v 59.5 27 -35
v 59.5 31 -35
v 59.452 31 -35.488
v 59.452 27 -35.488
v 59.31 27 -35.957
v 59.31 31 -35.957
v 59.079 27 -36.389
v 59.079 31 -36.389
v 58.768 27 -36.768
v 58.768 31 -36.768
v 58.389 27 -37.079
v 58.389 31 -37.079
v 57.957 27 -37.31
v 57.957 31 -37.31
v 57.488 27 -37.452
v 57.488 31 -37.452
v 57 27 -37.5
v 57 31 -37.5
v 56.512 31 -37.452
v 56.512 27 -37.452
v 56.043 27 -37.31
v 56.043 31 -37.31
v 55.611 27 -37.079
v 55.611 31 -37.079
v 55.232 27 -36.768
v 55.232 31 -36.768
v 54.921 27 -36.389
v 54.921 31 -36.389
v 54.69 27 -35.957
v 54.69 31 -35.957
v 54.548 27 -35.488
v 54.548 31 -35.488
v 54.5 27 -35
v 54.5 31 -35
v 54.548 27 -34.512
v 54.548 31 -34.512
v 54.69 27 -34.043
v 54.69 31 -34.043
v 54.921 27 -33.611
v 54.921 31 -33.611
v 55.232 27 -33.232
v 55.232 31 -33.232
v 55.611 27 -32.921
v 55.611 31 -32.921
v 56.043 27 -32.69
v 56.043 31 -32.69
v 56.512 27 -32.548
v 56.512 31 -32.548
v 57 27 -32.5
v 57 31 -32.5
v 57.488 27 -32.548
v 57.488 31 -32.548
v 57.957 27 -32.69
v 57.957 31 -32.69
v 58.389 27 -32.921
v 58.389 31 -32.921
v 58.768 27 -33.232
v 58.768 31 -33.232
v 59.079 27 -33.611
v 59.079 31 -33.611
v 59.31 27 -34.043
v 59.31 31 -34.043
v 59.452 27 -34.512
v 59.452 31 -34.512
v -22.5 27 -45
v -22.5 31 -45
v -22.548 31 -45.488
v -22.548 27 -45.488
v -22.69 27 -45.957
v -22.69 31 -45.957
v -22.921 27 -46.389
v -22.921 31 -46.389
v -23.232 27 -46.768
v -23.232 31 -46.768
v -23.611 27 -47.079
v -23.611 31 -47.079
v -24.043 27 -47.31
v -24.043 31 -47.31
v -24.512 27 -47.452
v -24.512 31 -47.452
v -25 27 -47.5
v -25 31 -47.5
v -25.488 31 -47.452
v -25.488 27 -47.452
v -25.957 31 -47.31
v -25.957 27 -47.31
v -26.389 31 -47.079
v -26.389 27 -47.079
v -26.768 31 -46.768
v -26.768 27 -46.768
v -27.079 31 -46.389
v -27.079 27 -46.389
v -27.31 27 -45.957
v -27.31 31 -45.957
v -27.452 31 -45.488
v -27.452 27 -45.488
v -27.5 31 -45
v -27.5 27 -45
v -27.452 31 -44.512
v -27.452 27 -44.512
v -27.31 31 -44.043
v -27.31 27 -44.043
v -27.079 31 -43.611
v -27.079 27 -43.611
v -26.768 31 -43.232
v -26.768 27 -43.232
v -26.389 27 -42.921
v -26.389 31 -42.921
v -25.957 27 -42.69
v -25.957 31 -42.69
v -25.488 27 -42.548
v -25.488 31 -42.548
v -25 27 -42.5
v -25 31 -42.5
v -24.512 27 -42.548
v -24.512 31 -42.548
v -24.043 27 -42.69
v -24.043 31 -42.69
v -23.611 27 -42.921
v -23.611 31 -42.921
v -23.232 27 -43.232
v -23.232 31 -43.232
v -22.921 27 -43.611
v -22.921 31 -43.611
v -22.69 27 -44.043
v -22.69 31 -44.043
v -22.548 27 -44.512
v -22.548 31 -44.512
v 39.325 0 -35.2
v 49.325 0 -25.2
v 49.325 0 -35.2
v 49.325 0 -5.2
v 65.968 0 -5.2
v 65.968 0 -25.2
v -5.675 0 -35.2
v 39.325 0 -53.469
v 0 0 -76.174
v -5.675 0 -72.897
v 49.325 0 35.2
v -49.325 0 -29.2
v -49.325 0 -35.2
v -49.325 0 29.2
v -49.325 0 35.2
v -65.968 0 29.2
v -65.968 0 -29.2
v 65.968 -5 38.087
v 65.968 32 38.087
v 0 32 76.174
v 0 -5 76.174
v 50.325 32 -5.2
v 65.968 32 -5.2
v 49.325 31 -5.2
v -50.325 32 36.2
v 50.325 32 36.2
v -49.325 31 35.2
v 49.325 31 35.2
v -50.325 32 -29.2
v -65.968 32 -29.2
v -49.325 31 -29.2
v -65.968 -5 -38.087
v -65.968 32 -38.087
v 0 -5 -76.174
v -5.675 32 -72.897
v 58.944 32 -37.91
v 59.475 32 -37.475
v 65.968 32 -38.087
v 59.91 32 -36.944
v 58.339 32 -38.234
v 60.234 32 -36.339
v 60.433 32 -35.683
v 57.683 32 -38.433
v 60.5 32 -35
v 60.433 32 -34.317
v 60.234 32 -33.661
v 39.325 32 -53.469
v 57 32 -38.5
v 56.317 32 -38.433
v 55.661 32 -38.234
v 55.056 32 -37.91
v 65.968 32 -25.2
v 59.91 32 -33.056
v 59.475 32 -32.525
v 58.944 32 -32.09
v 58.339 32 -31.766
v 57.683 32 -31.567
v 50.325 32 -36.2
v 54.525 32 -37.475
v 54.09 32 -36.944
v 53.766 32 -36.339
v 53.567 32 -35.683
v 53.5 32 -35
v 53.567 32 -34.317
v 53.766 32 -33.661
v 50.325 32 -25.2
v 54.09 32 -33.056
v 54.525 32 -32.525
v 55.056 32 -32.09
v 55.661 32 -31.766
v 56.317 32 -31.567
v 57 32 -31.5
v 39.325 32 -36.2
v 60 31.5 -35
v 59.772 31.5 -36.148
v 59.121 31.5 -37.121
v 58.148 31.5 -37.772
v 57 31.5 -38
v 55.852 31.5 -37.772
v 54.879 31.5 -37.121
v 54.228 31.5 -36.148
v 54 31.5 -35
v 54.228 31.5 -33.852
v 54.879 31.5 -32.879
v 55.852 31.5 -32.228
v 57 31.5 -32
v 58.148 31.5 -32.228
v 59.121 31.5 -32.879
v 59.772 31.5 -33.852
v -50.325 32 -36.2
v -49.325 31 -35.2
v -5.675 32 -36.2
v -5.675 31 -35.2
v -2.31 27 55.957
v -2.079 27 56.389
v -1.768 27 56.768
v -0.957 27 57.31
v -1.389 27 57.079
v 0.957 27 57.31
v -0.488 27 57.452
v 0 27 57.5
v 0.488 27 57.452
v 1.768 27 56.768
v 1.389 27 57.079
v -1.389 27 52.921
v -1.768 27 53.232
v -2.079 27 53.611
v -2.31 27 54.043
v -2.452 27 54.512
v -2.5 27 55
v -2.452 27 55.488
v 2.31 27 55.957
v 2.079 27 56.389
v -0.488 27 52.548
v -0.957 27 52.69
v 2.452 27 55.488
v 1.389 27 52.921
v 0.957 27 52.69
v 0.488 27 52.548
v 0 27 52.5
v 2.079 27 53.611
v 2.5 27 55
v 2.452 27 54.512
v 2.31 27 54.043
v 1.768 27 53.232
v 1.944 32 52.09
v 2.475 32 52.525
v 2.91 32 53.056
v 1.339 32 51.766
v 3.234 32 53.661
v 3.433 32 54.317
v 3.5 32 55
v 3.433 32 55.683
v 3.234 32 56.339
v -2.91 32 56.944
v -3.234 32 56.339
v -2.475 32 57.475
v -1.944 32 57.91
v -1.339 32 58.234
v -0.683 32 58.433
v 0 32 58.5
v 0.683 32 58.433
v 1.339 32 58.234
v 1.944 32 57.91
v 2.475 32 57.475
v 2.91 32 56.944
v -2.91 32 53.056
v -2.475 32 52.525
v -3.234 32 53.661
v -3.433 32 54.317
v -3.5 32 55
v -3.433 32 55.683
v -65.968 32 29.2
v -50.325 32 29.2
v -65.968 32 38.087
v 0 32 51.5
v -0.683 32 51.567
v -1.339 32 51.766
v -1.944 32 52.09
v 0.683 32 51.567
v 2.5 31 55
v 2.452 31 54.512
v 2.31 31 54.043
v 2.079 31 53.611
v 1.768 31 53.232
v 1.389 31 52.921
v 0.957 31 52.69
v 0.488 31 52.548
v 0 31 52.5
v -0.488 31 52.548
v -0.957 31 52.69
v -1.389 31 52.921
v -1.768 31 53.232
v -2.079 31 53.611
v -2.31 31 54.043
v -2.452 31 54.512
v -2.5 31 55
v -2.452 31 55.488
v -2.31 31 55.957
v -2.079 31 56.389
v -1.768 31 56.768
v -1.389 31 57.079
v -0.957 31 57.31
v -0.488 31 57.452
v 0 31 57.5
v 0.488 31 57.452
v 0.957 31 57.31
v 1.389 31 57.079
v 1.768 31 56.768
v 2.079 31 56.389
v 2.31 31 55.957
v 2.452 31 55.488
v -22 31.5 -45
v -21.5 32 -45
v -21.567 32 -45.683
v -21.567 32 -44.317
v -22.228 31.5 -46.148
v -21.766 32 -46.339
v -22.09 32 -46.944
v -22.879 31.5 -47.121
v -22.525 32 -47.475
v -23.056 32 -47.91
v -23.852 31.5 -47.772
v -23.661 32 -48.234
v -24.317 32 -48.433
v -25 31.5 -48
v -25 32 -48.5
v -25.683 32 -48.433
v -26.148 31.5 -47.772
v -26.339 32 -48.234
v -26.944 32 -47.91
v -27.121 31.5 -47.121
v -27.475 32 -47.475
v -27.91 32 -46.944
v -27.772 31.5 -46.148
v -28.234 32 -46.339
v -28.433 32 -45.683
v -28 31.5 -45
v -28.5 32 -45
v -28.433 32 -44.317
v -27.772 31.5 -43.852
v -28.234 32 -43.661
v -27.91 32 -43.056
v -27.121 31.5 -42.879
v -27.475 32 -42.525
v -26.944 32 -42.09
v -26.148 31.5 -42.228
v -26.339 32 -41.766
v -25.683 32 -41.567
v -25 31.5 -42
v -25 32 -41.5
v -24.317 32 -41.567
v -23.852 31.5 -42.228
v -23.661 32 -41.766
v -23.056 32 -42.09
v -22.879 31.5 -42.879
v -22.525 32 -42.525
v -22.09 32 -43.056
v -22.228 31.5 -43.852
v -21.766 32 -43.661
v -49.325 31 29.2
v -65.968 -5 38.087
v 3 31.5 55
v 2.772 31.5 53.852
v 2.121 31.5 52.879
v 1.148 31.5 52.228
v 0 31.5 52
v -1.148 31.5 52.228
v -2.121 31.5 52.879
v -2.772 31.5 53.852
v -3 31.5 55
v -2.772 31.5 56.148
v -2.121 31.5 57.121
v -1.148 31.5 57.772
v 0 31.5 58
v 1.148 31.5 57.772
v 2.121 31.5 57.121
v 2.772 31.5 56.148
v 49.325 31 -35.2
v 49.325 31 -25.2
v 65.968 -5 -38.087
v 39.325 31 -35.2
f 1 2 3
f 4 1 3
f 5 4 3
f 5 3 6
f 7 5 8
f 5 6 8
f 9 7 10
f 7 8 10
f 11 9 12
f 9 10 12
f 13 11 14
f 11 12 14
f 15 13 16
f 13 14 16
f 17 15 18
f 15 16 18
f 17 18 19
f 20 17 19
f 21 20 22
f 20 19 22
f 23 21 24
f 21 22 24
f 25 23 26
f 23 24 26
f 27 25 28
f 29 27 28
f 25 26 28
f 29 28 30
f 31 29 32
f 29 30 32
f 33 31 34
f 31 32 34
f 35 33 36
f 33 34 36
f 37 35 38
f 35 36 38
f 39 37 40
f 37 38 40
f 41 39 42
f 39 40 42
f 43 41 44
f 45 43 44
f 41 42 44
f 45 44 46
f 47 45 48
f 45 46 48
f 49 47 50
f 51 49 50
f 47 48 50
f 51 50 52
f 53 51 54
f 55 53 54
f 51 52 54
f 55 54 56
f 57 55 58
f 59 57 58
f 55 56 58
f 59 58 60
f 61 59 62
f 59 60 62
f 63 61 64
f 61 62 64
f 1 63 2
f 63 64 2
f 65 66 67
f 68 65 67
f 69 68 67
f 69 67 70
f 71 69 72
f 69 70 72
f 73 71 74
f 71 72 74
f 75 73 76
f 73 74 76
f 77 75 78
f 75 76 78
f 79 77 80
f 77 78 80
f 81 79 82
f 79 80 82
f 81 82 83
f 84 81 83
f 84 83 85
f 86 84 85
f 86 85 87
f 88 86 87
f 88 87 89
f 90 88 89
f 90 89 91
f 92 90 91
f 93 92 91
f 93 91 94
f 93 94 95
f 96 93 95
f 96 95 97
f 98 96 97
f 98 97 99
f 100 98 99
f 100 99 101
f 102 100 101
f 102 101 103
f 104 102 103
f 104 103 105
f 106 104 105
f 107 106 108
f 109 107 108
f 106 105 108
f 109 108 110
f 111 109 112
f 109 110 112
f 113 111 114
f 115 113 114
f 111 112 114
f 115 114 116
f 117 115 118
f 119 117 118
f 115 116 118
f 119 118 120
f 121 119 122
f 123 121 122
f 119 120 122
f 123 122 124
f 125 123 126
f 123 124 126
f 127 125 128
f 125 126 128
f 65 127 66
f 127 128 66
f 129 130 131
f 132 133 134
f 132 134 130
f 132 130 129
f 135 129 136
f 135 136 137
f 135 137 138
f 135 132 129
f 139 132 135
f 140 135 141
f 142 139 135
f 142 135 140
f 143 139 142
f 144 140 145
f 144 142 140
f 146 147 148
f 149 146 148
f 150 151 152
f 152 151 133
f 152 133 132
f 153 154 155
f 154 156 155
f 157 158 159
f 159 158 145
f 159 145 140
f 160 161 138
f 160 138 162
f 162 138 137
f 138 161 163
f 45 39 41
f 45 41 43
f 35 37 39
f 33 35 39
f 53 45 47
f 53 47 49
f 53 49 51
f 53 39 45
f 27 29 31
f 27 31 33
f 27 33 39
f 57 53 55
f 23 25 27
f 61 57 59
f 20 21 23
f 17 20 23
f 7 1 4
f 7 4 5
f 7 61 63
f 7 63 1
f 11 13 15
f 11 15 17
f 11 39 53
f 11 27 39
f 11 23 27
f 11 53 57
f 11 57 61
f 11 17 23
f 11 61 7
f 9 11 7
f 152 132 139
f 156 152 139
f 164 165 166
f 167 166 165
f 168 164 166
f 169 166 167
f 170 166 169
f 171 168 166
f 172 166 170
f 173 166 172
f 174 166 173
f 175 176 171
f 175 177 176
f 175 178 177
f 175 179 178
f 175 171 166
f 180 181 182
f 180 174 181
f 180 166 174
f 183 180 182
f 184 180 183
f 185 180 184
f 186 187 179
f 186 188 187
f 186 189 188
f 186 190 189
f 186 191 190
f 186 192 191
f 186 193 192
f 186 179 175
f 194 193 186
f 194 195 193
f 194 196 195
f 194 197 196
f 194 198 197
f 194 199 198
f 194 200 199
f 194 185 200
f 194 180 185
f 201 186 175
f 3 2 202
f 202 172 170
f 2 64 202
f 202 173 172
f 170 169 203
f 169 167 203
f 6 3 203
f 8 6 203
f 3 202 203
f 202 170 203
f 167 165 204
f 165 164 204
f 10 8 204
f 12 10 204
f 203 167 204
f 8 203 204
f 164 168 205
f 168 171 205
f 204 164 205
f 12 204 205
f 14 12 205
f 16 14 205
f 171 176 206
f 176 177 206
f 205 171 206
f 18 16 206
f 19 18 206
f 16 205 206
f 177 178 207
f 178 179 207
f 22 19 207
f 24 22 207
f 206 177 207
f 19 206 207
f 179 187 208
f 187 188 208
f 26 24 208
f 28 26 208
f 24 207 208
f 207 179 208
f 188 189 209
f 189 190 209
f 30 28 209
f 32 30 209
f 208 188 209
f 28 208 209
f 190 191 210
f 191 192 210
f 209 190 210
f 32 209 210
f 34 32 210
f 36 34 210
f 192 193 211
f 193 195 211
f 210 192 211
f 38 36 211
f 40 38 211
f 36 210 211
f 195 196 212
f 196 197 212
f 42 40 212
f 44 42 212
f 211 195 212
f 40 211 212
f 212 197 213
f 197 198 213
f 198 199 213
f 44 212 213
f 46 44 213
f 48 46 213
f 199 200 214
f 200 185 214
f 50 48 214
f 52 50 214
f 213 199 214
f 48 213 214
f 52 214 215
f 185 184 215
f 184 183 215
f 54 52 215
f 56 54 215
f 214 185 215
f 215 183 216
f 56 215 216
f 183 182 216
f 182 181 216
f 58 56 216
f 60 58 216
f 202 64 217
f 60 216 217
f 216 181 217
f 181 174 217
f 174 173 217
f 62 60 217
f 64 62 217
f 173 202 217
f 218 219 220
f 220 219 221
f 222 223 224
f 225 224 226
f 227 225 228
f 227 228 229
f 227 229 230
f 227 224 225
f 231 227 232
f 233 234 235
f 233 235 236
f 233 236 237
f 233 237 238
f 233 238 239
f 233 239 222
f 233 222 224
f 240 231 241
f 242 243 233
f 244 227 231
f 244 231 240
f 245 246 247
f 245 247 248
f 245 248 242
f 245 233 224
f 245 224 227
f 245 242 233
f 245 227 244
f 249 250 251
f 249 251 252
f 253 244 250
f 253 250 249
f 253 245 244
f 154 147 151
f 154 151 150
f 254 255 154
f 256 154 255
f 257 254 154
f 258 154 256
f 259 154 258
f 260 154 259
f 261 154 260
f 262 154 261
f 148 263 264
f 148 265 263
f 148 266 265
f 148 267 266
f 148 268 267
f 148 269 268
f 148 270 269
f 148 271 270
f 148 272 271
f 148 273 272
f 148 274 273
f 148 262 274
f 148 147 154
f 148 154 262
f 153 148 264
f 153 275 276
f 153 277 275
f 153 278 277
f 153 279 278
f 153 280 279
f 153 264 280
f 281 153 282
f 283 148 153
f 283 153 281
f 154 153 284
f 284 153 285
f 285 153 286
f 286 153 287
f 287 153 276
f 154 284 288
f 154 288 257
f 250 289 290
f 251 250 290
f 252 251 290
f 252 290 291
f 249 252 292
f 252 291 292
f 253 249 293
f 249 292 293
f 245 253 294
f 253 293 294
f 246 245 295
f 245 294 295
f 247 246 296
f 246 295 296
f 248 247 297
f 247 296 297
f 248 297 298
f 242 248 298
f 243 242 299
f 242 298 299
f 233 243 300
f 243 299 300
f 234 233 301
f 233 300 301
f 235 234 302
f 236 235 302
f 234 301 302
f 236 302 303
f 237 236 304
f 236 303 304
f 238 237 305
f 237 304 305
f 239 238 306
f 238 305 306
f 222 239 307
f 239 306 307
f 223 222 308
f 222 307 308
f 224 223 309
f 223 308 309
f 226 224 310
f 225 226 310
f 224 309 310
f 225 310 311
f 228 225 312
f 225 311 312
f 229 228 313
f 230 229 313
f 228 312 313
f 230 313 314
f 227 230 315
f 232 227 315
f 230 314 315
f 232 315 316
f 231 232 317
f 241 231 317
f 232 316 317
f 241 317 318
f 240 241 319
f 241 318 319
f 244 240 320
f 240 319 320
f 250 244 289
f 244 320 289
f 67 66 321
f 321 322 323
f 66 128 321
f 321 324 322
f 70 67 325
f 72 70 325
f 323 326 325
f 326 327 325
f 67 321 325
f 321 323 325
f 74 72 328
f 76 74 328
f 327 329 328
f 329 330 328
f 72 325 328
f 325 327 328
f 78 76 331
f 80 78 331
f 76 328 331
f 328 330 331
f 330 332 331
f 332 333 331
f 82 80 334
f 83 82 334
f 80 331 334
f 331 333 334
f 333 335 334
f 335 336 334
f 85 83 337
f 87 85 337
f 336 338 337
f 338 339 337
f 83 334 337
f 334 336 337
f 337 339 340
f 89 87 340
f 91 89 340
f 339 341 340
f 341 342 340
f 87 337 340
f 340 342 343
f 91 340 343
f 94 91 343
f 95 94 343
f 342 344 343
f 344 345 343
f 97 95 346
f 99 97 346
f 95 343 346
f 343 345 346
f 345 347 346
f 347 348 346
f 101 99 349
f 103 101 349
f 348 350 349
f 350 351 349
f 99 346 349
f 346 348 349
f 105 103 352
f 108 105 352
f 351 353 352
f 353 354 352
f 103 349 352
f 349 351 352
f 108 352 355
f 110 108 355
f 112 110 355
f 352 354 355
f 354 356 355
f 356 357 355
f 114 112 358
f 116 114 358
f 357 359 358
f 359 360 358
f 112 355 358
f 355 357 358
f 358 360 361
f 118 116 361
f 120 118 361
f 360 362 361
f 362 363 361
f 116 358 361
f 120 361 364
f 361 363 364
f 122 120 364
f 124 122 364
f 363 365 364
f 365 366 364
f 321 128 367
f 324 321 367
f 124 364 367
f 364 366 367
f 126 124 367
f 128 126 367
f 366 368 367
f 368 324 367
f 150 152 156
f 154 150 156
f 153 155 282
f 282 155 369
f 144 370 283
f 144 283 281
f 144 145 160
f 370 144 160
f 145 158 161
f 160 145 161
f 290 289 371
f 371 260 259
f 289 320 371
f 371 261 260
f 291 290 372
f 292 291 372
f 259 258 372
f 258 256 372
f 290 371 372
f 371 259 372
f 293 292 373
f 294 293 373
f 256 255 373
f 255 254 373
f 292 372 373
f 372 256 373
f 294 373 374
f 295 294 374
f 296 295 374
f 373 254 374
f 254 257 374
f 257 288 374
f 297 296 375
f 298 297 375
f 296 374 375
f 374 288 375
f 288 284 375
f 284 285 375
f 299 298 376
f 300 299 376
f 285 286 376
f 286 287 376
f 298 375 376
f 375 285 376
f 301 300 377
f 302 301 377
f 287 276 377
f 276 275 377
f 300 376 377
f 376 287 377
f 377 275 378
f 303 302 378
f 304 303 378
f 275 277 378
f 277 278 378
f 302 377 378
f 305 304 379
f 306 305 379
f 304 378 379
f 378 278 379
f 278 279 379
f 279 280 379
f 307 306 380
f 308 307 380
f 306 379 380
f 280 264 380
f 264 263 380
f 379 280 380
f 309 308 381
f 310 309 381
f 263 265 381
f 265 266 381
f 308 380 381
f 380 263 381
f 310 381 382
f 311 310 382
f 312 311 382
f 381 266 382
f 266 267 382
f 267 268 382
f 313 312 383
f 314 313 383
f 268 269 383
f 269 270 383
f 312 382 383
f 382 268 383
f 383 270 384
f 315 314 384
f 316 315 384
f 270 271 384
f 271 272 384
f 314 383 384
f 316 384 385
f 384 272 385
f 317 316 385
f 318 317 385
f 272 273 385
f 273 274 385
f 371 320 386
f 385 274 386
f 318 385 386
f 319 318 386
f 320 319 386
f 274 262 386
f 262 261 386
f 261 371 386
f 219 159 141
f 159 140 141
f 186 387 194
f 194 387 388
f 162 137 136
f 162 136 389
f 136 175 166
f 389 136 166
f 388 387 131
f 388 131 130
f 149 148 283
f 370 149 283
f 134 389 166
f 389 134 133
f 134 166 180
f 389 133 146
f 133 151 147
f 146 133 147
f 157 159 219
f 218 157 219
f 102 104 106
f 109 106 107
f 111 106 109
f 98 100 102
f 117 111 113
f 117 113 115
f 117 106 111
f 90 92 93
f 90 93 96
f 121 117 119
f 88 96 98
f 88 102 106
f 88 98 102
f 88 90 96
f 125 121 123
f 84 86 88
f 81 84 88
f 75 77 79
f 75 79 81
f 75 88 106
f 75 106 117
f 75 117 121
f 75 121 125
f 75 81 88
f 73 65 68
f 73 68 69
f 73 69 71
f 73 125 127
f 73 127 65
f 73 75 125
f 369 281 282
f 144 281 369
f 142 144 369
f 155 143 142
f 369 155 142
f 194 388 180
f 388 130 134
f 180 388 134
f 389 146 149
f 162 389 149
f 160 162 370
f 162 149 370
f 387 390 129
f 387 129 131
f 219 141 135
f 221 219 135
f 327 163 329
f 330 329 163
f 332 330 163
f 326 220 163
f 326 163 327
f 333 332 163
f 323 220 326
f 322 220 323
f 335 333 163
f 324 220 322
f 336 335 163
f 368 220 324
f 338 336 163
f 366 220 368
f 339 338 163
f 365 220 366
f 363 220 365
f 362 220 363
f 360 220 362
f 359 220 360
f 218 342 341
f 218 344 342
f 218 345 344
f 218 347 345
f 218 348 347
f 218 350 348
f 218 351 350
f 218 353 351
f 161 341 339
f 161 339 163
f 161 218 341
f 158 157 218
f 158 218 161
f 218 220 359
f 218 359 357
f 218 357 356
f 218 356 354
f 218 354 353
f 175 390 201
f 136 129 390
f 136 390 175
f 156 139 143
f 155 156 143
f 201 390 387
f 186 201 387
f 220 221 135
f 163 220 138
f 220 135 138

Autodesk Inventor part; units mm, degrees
ref_plane "YZ Plane" through (0, 0, 0) normal (1, 0, 0) x (0, 1, 0)
ref_plane "XZ Plane" through (0, 0, 0) normal (0, 1, 0) x (-1, 0, 0)
ref_plane "XY Plane" through (0, 0, 0) normal (0, 0, 1) x (1, 0, 0)
sketch "스케치2" plane through (0, 0, 0) normal (0, 1, 0) x (-1, 0, 0)
  line L0 (0, -70.4) -> (-60.9682, -35.2)
  line L1 (-60.9682, -35.2) -> (-60.9682, 35.2)
  line L2 (-60.9682, 35.2) -> (0, 70.4)
  line L3 (0, 70.4) -> (60.9682, 35.2)
  line L4 (60.9682, 35.2) -> (60.9682, -35.2)
  line L5 (60.9682, -35.2) -> (0, -70.4)
  line L6 (60.9682, -35.2) -> (-60.9682, -35.2)
  line L7 (-60.9682, -35.2) -> (-60.9682, 35.2)
  line L8 (-60.9682, 35.2) -> (60.9682, 35.2)
  line L9 (60.9682, 35.2) -> (60.9682, -35.2)
  line L10 (60.9682, -35.2) -> (-60.9682, 35.2) construction
  line L11 (-60.9682, -35.2) -> (60.9682, 35.2) construction
  line L12 (0, 76.1735) -> (-65.9682, 38.0868)
  line L13 (-65.9682, 38.0868) -> (-65.9682, -38.0868)
  line L14 (-65.9682, -38.0868) -> (0, -76.1735)
  line L15 (0, -76.1735) -> (65.9682, -38.0868)
  line L16 (65.9682, -38.0868) -> (65.9682, 38.0868)
  line L17 (65.9682, 38.0868) -> (0, 76.1735)
  line L18 (49.325, -35.2) -> (-49.325, -35.2)
  line L19 (-49.325, -35.2) -> (-49.325, 35.2)
  line L20 (-49.325, 35.2) -> (49.325, 35.2)
  line L21 (49.325, 35.2) -> (49.325, -35.2)
  line L22 (49.325, -35.2) -> (-49.325, 35.2) construction
  line L23 (-49.325, -35.2) -> (49.325, 35.2) construction
  line L24 (49.325, 35.2) -> (65.9682, 35.2)
  line L25 (65.9682, 35.2) -> (65.9682, 29.2)
  line L26 (65.9682, 29.2) -> (49.325, 29.2)
  line L27 (49.325, 29.2) -> (49.325, 35.2)
  line L28 (49.325, -35.2) -> (65.9682, -35.2)
  line L29 (65.9682, -35.2) -> (65.9682, -29.2)
  line L30 (65.9682, -29.2) -> (49.325, -29.2)
  line L31 (49.325, -29.2) -> (49.325, -35.2)
  line L32 (5.675, -35.2) -> (5.675, -72.897)
  line L33 (-49.325, -25.2) -> (-65.9682, -25.2)
  line L34 (-65.9682, -25.2) -> (-65.9682, -5.2)
  line L35 (-65.9682, -5.2) -> (-49.325, -5.2)
  line L36 (-49.325, -5.2) -> (-49.325, -25.2)
  line L37 (-39.325, -35.2) -> (-39.325, -53.4692)
  point P0 (0, 0)
  point P1 (0, 0)
  dimension "d2" = 70.4
  dimension "d3" = 70.4
  dimension "d4" = 5
  dimension "d5" = 98.65
  dimension "d6" = 6
  dimension "d7" = 6
  dimension "d9" = 10
  dimension "d10" = 30
  dimension "d15" = 10
  dimension "d16" = 55
extrude "돌출1" add sketch "스케치2" along normal blind 32 contours L37 L14 L13 L33 L1 L0 | L0 L6 L37 | L32 L6 L5 | L5 L28 L16 L15 L32 | L1 L33 L19 L6 | L6 L21 L30 L4 | L4 L30 L16 L28 | L35 L13 L12 L17 L16 L24 L3 L2 L1 | L1 L8 L19 L35 | L26 L21 L8 L4 | L4 L24 L16 L26 | L2 L3 L8
sketch "스케치3" plane through (0, 0, 0) normal (0, 1, 0) x (-1, 0, 0)
  line L0 (0, 76.1735) -> (-65.9682, 38.0868) construction
  line L1 (0, 76.1735) -> (65.9682, 38.0868)
  line L2 (65.9682, 38.0868) -> (65.9682, -38.0868)
  line L3 (65.9682, -38.0868) -> (0, -76.1735)
  line L4 (0, -76.1735) -> (-65.9682, -38.0868)
  line L5 (-65.9682, -38.0868) -> (-65.9682, 38.0868)
  line L6 (-65.9682, 38.0868) -> (0, 76.1735)
  point P0 (0, 0)
  point P1 (0, 0)
extrude "돌출2" add sketch "스케치3" against normal blind 5
sketch "스케치4" plane through (0, 32, 0) normal (0, 1, 0) x (1, 0, 0)
  circle A0 centre (0, -55) radius 2.5
  circle A1 centre (-25, 45) radius 2.5
  circle A2 centre (57, 35) radius 2.5
  point P0 (0, 0)
  dimension "d17" = 5
  dimension "d18" = 55
  dimension "d19" = 5
  dimension "d20" = 45
  dimension "d21" = 25
  dimension "d22" = 5
  dimension "d23" = 57
  dimension "d24" = 35
extrude "돌출3" cut sketch "스케치4" against normal blind 5
chamfer "모따기1" distance 1 angle 45 10 edges at (-2.5, 32, 55) (-27.5, 32, -45) (54.5, 32, -35) (-27.5, 32, -35.2) (-49.325, 32, -32.2) (-49.325, 32, 32.2) (0, 32, 35.2) (44.325, 32, -35.2) (49.325, 32, -30.2) (49.325, 32, 15)
equation "\"d3\" = d2"
properties part number "pi_case_bottom"
